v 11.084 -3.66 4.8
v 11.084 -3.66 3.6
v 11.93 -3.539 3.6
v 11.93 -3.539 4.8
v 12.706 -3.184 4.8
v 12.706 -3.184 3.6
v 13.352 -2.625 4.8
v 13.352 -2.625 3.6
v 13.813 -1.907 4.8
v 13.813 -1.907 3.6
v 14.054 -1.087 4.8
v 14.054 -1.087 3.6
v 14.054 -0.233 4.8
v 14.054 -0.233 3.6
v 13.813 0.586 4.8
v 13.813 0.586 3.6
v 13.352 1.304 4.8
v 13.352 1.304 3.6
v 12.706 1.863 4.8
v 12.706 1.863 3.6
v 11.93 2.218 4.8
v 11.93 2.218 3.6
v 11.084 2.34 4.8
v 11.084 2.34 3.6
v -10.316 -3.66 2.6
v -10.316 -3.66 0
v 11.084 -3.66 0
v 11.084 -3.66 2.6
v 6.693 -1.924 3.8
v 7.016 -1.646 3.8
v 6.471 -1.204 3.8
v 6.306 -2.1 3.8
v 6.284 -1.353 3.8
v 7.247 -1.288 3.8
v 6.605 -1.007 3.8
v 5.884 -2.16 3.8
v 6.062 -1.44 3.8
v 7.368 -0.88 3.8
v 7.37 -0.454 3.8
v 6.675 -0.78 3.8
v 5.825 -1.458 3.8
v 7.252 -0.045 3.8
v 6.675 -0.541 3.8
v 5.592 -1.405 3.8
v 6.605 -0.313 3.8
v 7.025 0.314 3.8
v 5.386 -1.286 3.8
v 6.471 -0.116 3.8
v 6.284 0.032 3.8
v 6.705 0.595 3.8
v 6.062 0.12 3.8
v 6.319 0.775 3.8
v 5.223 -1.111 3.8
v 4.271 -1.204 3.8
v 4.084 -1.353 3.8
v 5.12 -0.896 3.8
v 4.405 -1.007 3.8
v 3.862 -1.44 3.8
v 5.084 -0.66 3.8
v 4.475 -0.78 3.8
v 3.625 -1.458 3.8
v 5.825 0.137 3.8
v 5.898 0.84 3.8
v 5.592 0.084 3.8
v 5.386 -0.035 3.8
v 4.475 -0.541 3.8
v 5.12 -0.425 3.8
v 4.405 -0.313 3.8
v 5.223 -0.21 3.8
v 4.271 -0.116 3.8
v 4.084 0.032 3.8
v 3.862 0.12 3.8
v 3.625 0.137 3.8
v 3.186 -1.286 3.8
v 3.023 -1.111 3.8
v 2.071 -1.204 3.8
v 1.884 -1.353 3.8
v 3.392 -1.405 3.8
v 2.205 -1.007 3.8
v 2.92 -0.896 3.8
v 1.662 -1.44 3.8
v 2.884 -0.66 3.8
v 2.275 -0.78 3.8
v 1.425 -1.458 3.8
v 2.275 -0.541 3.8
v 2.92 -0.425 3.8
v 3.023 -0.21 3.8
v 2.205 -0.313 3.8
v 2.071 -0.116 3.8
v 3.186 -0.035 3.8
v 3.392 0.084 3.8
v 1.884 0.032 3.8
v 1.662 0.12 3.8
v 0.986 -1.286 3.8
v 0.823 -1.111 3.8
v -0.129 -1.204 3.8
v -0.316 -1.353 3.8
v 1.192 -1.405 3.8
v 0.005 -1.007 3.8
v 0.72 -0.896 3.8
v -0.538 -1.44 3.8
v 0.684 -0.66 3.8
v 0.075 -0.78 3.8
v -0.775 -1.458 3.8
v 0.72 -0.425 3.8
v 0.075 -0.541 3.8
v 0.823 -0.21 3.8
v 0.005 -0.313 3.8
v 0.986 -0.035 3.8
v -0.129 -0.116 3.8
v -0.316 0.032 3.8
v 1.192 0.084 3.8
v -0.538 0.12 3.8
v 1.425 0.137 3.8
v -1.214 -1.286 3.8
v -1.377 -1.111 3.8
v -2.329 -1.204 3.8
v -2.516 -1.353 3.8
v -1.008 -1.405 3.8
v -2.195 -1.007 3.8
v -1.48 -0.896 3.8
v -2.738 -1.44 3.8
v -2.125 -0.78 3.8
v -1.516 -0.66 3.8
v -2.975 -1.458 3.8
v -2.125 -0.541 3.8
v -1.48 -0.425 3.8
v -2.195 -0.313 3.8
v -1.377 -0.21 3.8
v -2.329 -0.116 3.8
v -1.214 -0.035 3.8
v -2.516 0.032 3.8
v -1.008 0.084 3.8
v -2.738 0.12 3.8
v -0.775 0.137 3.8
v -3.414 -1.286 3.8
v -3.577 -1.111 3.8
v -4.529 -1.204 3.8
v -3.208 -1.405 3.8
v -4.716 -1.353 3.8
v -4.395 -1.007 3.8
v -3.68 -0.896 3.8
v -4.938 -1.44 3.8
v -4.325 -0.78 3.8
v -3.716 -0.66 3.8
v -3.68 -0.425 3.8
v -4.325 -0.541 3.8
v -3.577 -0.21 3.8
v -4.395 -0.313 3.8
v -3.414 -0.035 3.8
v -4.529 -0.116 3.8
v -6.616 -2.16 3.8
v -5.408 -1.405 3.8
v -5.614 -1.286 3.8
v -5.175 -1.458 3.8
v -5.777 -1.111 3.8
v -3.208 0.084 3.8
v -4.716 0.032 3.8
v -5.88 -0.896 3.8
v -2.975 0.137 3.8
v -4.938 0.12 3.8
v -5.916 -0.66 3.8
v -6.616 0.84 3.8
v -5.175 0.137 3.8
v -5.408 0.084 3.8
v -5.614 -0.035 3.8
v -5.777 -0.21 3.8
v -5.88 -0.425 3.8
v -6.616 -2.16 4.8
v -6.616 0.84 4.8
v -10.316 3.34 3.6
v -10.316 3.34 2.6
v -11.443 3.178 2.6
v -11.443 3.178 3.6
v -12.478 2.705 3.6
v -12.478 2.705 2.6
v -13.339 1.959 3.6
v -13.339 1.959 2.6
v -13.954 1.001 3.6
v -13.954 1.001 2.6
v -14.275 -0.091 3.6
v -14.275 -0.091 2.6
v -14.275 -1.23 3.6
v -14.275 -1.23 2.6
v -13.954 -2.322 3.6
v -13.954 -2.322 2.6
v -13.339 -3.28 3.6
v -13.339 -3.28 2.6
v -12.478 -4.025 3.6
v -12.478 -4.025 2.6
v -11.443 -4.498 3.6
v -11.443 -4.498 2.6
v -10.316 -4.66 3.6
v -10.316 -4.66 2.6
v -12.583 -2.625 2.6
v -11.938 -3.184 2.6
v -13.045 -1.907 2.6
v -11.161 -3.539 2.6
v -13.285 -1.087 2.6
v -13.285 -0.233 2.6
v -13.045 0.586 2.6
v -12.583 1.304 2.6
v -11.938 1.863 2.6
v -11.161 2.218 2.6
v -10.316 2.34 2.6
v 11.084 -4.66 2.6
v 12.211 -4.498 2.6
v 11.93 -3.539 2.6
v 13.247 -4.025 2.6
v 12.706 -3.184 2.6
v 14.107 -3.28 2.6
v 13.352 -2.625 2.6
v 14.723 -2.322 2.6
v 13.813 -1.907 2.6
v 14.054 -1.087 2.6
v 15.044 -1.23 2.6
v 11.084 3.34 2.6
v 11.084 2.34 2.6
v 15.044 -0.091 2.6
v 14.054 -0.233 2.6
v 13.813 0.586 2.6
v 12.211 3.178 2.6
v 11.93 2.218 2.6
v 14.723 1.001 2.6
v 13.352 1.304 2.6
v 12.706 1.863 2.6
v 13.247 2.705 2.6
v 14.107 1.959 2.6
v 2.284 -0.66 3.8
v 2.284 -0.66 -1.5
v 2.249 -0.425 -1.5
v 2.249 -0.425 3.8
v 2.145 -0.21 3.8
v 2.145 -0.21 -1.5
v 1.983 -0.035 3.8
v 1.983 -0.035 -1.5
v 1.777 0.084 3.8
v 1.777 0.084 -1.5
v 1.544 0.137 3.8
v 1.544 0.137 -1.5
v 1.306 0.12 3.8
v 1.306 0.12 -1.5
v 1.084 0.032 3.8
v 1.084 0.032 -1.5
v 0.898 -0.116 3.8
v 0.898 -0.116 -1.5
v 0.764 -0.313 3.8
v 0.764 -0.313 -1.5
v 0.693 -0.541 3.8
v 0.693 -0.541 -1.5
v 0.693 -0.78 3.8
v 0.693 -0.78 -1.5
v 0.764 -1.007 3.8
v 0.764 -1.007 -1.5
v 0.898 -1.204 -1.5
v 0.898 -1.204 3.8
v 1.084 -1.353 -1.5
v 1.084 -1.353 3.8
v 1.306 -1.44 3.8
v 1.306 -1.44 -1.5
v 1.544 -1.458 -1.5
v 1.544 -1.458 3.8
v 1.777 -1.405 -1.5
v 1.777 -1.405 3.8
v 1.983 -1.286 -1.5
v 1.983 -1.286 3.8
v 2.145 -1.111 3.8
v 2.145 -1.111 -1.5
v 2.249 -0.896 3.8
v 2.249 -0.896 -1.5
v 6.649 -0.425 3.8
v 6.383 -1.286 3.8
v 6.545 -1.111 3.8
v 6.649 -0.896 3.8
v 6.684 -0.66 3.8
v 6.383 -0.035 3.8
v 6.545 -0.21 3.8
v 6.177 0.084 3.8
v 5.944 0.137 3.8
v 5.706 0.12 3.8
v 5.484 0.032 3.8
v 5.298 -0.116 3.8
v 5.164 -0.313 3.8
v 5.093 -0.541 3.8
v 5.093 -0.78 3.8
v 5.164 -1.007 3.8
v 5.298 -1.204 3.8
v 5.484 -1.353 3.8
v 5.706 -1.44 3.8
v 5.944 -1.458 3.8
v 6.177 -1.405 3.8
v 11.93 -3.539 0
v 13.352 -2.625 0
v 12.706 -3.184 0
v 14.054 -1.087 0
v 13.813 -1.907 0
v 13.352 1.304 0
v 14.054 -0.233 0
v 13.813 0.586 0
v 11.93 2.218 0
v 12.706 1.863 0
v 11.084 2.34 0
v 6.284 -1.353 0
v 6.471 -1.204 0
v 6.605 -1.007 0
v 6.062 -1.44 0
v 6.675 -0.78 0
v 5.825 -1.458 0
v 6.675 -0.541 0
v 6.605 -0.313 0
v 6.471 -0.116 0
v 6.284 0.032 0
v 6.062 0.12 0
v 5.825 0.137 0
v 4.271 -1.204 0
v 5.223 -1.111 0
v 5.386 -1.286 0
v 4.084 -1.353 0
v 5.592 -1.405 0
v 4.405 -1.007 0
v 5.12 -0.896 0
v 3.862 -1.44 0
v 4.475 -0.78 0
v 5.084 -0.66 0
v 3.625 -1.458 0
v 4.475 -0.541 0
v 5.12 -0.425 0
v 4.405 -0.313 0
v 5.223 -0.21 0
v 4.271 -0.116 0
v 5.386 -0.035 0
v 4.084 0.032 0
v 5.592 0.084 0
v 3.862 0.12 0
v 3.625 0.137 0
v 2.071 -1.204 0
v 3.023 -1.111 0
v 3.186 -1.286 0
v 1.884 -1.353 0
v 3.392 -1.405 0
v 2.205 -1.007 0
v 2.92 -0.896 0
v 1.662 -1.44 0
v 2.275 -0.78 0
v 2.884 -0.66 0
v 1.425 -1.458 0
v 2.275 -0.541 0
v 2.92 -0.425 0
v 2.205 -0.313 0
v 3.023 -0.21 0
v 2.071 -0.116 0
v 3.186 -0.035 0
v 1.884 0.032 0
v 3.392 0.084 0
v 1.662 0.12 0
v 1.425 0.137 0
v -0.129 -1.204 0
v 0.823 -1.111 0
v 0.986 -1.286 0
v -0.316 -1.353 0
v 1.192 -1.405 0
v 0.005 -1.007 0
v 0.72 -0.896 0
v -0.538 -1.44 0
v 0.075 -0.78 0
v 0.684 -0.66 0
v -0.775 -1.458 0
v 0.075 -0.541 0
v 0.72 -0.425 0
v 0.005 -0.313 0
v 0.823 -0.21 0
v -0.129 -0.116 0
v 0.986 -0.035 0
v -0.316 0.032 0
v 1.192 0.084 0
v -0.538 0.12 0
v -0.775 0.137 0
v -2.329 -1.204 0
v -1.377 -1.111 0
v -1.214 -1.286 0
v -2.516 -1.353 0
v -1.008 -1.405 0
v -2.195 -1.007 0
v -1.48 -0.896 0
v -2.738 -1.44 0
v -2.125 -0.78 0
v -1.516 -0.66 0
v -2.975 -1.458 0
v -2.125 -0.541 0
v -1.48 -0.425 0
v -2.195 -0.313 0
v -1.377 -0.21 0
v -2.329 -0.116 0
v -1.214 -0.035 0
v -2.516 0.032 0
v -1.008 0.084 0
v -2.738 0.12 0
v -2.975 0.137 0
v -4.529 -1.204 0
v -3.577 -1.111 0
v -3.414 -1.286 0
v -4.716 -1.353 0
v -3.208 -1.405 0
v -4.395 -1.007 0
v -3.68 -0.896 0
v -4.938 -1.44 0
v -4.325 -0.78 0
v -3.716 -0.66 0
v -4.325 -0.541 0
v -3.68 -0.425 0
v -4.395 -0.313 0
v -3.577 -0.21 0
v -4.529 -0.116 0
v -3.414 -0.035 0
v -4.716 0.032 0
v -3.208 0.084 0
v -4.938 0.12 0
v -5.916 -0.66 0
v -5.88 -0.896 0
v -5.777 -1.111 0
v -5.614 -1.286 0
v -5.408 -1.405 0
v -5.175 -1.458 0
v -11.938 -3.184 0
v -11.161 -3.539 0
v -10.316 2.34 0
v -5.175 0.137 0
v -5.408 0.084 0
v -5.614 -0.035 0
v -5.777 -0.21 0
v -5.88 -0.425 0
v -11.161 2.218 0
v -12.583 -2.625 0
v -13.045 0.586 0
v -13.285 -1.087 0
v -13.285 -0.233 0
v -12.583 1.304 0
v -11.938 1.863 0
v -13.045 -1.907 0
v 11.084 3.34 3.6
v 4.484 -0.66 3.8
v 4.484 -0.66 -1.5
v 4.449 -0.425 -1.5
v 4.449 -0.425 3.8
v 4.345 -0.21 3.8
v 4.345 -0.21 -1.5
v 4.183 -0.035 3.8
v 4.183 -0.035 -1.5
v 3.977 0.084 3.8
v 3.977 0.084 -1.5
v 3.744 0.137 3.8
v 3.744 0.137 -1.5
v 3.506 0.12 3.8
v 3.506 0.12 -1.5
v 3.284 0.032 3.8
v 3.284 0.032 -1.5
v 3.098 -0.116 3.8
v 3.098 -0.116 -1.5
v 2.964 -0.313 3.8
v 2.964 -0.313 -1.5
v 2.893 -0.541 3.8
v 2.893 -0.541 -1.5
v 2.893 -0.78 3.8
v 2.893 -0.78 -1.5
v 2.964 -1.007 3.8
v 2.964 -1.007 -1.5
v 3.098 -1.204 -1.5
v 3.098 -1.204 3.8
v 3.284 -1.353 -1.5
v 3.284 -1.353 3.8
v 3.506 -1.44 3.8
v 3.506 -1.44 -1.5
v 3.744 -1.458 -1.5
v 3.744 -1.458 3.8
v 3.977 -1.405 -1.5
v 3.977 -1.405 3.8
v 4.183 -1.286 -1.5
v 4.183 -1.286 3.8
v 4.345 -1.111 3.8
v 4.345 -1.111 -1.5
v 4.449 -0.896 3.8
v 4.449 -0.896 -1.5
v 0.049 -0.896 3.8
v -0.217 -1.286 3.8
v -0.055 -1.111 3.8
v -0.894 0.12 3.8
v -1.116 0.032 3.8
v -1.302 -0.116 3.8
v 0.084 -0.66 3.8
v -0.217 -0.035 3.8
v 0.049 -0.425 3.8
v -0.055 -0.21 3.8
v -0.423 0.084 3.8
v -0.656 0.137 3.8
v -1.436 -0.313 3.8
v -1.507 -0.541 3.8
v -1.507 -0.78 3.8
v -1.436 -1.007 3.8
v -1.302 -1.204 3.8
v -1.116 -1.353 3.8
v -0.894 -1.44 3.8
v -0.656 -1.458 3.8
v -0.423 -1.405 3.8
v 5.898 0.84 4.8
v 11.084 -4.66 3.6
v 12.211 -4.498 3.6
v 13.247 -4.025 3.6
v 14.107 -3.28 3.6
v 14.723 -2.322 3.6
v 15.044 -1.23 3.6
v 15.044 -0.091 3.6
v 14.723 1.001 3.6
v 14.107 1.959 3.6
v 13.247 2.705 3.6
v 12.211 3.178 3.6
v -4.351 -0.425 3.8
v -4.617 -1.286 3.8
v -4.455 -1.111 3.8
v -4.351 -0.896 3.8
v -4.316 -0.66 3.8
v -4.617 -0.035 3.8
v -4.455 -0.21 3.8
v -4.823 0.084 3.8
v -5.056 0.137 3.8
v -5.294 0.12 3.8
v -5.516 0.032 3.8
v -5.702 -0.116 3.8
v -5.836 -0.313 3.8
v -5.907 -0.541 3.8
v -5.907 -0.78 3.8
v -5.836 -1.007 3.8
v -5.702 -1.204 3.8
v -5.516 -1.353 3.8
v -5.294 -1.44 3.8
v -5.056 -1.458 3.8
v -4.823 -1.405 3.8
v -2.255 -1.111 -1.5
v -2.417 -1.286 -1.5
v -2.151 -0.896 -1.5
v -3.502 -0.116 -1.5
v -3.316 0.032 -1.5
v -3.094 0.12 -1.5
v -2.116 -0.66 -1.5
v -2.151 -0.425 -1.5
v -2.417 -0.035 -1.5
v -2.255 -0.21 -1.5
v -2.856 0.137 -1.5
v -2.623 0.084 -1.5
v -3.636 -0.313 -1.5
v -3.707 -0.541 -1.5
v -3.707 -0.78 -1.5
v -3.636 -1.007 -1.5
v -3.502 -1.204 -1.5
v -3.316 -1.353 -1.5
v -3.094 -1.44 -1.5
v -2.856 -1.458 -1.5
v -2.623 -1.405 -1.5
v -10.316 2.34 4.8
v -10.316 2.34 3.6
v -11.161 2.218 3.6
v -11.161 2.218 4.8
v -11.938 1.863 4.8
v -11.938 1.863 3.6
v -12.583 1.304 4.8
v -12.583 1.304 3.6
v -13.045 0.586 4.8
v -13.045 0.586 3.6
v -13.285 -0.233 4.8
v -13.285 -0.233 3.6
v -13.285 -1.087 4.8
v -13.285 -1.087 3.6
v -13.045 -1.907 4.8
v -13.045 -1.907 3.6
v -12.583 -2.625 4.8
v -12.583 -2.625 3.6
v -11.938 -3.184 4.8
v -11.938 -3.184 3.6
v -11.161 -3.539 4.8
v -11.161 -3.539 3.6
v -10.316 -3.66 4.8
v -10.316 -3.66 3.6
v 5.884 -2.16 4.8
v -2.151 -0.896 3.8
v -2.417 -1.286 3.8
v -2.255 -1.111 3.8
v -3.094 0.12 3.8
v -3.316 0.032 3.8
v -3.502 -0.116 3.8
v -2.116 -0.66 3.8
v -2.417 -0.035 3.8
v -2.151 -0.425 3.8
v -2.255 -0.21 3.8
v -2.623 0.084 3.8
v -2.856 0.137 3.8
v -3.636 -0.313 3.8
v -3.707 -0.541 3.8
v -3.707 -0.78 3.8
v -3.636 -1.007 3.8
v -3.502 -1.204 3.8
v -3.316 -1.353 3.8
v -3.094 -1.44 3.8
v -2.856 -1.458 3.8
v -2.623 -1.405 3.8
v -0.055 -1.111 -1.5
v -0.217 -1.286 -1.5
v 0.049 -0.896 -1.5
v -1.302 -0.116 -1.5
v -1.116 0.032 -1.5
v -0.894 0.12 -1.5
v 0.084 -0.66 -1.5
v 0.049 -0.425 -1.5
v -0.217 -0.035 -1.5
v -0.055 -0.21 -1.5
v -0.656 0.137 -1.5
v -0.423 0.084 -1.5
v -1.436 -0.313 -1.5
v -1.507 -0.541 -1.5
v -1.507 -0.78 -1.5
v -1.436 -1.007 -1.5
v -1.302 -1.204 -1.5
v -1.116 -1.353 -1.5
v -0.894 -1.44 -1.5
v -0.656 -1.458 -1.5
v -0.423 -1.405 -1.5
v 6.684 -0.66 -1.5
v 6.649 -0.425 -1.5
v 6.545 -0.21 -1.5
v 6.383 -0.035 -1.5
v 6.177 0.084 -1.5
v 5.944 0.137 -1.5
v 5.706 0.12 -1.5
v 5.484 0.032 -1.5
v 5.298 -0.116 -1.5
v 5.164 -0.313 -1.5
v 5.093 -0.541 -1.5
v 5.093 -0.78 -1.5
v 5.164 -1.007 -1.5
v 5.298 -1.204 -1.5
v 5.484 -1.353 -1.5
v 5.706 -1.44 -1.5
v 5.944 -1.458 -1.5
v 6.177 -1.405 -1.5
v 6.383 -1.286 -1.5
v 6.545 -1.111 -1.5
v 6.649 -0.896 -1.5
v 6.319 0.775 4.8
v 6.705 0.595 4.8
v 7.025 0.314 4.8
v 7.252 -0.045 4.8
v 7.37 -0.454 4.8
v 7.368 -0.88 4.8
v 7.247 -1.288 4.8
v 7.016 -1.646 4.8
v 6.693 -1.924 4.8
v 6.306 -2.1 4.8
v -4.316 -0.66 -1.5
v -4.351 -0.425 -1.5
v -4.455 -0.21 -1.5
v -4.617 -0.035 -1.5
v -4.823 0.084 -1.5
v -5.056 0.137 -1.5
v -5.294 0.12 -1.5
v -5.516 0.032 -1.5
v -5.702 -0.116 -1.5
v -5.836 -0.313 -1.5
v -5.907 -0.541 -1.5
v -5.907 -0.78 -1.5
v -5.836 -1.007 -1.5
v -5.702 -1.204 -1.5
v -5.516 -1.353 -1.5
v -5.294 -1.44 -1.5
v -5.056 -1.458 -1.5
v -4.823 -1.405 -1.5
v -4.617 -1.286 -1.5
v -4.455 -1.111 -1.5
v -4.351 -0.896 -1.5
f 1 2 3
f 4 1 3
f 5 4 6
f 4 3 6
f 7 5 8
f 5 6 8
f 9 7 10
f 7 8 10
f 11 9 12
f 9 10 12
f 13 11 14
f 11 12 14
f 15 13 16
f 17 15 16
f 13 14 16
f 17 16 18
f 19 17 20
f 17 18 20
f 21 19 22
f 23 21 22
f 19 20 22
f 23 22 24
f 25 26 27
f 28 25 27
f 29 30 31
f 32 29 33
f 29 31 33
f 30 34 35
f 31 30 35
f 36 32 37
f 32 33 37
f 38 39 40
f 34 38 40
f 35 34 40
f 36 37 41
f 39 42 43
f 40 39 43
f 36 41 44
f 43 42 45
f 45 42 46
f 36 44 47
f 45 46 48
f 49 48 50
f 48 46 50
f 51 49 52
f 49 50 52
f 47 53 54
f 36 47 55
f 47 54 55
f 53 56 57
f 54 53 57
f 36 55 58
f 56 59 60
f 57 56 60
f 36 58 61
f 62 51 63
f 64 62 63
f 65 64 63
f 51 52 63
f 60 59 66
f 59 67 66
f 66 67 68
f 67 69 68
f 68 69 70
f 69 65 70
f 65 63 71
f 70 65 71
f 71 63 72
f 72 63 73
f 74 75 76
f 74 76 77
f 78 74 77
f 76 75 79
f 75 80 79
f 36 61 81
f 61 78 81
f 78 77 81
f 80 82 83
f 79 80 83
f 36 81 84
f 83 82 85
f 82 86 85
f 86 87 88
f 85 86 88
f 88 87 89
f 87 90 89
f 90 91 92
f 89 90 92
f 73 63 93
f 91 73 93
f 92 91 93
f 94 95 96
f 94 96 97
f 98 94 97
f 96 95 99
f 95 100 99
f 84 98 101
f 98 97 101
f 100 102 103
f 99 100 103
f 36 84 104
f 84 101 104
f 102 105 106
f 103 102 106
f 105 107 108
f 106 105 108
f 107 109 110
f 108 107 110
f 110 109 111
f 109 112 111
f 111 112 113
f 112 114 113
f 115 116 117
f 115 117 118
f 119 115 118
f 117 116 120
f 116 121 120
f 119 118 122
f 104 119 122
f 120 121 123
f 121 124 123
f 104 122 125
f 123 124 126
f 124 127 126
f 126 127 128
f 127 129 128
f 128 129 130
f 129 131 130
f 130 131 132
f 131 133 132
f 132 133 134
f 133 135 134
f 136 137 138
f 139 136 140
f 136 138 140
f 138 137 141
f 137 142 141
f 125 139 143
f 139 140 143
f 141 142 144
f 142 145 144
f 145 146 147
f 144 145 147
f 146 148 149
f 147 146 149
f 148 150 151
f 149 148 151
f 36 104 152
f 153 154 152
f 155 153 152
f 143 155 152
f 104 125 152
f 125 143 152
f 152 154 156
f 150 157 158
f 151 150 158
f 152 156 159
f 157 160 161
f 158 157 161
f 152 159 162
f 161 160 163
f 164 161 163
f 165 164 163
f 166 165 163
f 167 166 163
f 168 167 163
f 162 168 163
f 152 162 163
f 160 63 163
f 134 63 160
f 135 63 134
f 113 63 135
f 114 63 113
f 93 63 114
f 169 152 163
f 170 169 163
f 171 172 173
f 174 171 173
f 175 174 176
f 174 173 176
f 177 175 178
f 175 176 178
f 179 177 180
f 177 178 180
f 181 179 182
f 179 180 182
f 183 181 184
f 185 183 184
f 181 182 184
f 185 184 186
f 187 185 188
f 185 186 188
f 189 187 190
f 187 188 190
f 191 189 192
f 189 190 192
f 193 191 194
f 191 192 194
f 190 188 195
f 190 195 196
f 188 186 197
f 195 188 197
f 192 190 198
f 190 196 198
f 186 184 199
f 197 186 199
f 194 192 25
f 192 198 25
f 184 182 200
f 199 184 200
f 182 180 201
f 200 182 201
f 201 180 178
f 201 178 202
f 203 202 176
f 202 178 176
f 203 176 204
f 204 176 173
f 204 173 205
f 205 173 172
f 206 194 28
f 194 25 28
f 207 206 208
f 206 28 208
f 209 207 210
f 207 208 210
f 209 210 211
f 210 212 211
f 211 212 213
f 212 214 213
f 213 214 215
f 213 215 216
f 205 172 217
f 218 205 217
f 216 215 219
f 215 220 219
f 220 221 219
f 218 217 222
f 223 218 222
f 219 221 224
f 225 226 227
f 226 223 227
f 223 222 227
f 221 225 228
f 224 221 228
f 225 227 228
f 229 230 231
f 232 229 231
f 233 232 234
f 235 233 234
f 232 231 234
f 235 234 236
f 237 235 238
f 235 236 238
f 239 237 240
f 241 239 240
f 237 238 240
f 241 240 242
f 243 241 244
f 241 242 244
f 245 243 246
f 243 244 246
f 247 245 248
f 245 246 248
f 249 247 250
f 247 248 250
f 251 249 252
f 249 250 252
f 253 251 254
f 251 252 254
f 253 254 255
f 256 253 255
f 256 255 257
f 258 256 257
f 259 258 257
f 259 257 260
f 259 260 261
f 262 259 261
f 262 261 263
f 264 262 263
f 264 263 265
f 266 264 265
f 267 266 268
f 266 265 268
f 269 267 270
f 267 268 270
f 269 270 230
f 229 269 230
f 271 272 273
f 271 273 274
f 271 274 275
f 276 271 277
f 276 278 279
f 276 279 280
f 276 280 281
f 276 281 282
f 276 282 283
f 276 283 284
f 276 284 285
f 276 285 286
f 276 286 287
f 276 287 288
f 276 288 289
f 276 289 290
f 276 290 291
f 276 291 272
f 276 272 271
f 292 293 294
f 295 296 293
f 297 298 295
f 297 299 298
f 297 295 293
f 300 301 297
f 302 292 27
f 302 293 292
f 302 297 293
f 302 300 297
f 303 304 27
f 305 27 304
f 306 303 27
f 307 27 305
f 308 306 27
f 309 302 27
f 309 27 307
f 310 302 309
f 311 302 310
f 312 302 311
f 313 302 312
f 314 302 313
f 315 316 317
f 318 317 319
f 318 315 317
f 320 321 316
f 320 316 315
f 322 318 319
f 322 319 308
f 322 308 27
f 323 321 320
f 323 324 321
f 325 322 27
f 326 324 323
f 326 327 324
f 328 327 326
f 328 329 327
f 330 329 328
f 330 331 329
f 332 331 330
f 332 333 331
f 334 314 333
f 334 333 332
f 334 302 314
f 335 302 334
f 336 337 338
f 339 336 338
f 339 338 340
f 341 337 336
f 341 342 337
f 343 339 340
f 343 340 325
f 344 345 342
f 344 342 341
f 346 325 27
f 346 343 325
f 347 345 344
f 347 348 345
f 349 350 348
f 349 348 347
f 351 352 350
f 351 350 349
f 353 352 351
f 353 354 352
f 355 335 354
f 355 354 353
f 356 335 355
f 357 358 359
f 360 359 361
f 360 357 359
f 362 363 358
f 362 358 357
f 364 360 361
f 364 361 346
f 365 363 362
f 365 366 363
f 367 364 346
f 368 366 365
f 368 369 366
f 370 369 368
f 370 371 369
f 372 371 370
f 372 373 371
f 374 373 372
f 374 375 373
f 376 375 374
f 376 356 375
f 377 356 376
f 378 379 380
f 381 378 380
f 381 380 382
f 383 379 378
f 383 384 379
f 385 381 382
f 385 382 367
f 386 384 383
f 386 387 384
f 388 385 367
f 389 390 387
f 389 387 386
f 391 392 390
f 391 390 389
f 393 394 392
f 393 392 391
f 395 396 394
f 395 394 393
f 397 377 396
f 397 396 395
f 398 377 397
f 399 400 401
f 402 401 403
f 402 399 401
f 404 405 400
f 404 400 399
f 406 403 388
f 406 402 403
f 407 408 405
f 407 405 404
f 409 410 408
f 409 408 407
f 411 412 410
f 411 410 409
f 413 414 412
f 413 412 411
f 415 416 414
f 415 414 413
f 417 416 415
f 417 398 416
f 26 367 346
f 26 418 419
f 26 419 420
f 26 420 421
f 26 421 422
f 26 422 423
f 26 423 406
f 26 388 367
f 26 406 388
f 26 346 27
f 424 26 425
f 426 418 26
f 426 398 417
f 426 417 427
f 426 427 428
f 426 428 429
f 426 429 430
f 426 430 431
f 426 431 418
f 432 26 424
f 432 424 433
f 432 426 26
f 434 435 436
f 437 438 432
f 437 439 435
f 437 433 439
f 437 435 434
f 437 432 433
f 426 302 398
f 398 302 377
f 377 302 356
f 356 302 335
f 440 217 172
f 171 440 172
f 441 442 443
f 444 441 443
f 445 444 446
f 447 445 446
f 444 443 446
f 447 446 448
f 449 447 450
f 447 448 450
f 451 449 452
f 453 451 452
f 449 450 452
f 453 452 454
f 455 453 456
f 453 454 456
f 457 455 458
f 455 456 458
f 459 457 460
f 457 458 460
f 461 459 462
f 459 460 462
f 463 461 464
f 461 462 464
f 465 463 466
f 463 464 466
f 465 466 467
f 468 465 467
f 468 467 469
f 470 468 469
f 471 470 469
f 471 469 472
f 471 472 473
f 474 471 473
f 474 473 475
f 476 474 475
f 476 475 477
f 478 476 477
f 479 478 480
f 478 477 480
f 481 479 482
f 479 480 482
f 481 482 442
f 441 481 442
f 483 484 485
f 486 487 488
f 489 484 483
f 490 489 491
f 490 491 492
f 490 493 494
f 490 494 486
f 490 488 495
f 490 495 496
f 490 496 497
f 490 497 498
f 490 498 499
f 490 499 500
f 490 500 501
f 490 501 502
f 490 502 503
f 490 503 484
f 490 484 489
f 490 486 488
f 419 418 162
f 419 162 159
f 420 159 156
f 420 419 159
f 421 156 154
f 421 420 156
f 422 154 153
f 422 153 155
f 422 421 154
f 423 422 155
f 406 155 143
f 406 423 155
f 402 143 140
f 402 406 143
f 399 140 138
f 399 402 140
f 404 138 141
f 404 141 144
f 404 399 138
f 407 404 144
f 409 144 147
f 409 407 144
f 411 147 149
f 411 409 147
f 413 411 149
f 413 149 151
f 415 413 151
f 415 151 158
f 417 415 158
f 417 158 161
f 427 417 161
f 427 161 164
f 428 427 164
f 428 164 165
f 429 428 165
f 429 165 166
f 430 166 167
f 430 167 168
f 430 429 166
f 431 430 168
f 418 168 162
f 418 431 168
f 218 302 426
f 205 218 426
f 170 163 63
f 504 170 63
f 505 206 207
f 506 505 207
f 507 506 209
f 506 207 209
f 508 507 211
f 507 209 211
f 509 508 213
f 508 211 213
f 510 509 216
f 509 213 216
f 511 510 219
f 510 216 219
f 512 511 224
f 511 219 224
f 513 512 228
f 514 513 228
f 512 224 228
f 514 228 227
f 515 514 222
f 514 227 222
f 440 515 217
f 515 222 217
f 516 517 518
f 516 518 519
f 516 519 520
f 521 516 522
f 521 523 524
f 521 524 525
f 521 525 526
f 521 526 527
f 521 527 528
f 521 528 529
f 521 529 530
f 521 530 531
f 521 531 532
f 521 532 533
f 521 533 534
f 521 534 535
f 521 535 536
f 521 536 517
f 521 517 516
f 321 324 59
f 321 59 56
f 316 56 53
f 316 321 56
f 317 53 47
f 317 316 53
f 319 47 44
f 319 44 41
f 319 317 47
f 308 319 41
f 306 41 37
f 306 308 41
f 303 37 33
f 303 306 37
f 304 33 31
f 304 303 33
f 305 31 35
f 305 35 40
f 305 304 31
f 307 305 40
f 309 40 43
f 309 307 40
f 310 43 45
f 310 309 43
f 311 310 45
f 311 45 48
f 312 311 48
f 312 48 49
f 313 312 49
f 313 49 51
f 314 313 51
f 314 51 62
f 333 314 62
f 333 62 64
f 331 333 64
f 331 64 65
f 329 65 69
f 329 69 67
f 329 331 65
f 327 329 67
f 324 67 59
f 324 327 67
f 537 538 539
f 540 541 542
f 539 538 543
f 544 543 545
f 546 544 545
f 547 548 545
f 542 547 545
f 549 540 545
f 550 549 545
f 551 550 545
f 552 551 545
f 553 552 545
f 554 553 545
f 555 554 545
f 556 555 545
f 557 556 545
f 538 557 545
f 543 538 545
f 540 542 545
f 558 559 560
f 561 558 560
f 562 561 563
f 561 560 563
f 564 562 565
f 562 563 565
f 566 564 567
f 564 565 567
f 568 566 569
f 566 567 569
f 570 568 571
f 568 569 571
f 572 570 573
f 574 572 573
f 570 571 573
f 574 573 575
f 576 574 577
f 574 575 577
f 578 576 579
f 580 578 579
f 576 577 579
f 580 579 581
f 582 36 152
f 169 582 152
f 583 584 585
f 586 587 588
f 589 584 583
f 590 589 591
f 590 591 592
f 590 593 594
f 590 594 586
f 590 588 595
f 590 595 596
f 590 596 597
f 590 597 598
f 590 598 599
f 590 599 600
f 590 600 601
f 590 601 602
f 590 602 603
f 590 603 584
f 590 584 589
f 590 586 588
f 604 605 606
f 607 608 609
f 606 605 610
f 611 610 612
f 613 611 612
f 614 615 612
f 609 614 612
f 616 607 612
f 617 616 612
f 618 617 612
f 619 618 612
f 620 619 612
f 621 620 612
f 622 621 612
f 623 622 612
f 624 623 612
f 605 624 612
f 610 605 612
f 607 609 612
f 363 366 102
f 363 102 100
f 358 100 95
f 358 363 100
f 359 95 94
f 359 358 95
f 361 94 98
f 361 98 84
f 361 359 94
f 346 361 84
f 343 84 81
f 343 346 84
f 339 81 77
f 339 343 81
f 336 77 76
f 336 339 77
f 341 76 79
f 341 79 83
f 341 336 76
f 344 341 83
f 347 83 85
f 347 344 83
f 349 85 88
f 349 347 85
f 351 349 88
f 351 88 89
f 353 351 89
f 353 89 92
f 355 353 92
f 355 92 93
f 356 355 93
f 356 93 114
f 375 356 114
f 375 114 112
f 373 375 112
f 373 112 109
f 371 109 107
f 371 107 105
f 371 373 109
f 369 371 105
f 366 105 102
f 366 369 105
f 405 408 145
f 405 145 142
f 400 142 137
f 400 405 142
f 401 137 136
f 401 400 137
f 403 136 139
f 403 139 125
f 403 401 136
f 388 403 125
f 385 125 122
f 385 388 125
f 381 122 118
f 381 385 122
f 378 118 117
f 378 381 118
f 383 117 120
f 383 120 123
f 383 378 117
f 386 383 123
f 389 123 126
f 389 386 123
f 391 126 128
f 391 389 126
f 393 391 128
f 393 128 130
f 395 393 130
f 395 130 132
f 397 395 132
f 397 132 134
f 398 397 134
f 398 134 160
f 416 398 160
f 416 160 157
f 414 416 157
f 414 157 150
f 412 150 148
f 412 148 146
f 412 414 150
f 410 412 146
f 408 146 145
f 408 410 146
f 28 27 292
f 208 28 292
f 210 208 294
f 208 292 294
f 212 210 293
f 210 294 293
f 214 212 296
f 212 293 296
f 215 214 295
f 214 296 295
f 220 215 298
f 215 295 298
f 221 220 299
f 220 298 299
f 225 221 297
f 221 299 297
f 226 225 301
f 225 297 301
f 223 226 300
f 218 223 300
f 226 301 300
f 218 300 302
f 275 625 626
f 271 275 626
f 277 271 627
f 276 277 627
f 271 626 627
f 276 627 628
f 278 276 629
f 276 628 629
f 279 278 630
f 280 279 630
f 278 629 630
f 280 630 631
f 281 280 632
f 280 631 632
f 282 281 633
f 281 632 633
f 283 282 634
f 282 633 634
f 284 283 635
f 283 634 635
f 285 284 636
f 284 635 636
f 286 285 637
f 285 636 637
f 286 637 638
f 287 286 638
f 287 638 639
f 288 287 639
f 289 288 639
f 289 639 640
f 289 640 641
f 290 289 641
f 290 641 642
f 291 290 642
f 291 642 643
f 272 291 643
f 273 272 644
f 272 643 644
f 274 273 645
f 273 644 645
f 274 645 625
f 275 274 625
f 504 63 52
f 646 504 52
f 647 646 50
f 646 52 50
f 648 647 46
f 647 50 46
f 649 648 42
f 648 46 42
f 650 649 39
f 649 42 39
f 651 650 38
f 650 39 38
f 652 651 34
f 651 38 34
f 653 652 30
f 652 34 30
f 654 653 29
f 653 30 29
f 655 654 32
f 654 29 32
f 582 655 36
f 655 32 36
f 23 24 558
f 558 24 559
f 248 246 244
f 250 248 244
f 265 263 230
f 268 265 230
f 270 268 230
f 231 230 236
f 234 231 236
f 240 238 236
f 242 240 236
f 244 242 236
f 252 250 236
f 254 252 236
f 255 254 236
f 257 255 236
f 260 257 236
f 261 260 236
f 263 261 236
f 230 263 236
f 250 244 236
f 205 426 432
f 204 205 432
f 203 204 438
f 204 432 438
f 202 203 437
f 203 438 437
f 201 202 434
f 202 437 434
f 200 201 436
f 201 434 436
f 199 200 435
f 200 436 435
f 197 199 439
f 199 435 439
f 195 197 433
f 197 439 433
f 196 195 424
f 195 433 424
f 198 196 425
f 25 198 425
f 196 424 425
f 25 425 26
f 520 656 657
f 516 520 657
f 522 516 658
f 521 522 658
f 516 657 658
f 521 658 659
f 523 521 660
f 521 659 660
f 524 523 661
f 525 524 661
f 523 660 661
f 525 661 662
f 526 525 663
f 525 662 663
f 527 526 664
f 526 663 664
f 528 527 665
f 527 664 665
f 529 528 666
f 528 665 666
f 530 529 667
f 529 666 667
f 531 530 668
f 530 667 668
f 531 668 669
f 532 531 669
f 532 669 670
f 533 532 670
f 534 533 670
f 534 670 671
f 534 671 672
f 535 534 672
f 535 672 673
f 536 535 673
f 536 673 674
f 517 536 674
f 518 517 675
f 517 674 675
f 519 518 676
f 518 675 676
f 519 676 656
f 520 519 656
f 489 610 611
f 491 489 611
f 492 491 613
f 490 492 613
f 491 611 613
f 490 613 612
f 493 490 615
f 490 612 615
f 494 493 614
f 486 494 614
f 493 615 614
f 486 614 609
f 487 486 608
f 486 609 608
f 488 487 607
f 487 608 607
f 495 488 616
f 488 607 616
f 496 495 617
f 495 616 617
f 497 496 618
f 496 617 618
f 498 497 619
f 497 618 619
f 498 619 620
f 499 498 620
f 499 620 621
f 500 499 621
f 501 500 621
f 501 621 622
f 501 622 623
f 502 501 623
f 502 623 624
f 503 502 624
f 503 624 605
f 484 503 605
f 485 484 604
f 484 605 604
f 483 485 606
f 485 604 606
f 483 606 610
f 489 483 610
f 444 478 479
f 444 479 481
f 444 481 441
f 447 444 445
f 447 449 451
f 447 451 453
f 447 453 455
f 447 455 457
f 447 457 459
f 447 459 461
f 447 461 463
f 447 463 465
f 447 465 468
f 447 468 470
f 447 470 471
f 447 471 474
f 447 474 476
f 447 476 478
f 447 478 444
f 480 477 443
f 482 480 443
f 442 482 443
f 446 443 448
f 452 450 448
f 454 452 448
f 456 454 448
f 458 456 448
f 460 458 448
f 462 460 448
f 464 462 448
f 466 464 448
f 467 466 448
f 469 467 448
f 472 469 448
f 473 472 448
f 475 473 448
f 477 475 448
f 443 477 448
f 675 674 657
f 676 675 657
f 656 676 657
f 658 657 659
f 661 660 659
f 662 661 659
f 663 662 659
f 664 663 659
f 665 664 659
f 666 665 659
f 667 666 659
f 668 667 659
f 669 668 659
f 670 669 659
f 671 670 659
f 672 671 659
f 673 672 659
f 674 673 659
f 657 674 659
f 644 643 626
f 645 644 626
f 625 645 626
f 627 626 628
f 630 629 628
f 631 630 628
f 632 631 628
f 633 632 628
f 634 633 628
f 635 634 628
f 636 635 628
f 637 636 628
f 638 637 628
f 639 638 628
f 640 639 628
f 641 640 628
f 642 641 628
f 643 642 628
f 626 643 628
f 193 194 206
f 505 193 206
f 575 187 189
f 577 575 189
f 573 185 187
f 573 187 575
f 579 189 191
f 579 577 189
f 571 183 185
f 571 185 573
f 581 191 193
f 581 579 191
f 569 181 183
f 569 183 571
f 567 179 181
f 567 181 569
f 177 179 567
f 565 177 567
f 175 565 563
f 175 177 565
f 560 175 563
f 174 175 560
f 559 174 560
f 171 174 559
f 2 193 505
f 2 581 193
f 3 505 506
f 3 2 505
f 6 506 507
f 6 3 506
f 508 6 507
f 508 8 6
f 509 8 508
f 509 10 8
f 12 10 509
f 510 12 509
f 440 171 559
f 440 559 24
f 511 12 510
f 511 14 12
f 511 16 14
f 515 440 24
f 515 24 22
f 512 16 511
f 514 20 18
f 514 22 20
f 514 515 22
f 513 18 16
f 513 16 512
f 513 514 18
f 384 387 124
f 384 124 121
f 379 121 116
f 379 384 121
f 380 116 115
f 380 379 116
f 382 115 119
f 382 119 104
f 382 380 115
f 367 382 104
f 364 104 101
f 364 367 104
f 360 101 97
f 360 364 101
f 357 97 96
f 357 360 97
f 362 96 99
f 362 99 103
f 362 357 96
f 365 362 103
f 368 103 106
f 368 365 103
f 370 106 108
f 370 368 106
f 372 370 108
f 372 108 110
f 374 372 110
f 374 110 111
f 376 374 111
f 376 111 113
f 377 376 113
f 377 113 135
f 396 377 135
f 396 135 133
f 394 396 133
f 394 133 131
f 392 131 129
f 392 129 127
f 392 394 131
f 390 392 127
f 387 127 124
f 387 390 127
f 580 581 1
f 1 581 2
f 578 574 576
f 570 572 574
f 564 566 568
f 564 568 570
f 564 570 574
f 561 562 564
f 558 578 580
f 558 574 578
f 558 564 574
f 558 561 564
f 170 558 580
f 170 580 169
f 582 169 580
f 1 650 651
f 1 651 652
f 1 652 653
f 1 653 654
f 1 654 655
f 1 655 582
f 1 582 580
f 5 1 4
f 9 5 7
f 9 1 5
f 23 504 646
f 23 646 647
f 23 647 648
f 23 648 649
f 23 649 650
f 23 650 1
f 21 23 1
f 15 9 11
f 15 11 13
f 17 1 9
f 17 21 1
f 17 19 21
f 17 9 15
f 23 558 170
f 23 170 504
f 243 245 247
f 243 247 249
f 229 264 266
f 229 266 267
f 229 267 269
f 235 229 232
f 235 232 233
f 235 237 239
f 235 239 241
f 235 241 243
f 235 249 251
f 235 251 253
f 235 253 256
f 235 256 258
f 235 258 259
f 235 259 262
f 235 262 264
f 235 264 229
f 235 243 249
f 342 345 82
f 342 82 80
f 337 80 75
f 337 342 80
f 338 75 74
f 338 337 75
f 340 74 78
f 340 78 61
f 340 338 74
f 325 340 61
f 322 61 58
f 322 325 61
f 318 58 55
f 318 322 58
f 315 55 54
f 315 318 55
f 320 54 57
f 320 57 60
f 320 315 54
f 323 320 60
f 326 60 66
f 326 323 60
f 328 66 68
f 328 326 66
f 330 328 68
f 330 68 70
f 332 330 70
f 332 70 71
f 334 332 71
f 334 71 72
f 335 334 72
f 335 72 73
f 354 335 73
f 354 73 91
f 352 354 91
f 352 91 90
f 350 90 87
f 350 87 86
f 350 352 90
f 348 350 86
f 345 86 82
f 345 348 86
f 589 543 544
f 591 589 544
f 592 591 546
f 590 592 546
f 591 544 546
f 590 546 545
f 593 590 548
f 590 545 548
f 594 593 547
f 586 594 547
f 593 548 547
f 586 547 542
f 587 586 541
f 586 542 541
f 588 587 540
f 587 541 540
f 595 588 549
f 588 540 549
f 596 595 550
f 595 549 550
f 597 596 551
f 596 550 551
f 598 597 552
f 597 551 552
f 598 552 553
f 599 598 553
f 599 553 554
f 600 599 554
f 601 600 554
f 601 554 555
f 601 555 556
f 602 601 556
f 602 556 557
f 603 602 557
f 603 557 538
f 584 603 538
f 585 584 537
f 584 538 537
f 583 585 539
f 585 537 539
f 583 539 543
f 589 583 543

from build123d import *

# Parameters (mm, degrees)
BOSS_EXTRUDE1_DEPTH        = 4.8
SKETCH1_3_R                = 0.8
BOSS_EXTRUDE2_DEPTH        = 3.8
BOSS_EXTRUDE3_START        = 2.6
BOSS_EXTRUDE3_DEPTH        = 1
BOSS_EXTRUDE4_DEPTH        = 3.8
BOSS_EXTRUDE4_DEPTH_BACK   = 1.5
SKETCH1_5_R                = 0.8
BOSS_EXTRUDE4_2_DEPTH      = 3.8
BOSS_EXTRUDE4_2_DEPTH_BACK = 1.5
BOSS_EXTRUDE4_3_DEPTH      = 3.8
BOSS_EXTRUDE4_3_DEPTH_BACK = 1.5
BOSS_EXTRUDE4_4_DEPTH      = 3.8
BOSS_EXTRUDE4_4_DEPTH_BACK = 1.5
BOSS_EXTRUDE4_5_DEPTH      = 3.8
BOSS_EXTRUDE4_5_DEPTH_BACK = 1.5
BOSS_EXTRUDE4_6_DEPTH      = 3.8
BOSS_EXTRUDE4_6_DEPTH_BACK = 1.5


with BuildPart() as part:
    # Sketch1 → Boss-Extrude1 (new body)
    with BuildSketch(Plane.XY):
        with BuildLine():
            Line((11.084370489, 2.339660796), (-10.315629511, 2.339660796))
            ThreePointArc((-10.315629511, 2.339660796), (-13.315629511, -0.660339204), (-10.315629511, -3.660339204))
            Line((-10.315629511, -3.660339204), (11.084370489, -3.660339204))
            ThreePointArc((11.084370489, -3.660339204), (14.084370489, -0.660339204), (11.084370489, 2.339660796))
        make_face()
        with BuildLine():
            ThreePointArc((5.898308619, 0.839596037), (7.384354299, -0.667308526), (5.884370126, -2.160339204))
            Line((5.884370126, -2.160339204), (-6.615645701, -2.16033618))
            Line((-6.615645701, -2.16033618), (-6.615645701, 0.839596037))
            Line((-6.615645701, 0.839596037), (5.898308619, 0.839596037))
        make_face(mode=Mode.SUBTRACT)
    extrude(amount=BOSS_EXTRUDE1_DEPTH)

    # Sketch1<3> → Boss-Extrude2 (add)
    with BuildSketch(Plane.XY):
        with BuildLine():
            Line((-6.615645701, -2.16033618), (5.884370126, -2.160339204))
            ThreePointArc((5.884370126, -2.160339204), (7.384354299, -0.667308526), (5.898308619, 0.839596037))
            Line((5.898308619, 0.839596037), (-6.615645701, 0.839596037))
            Line((-6.615645701, 0.839596037), (-6.615645701, -2.16033618))
        make_face()
        with Locations((-5.115629511, -0.660339204)):
            Circle(SKETCH1_3_R, mode=Mode.SUBTRACT)
        with Locations((-2.915629511, -0.660339204)):
            Circle(SKETCH1_3_R, mode=Mode.SUBTRACT)
        with Locations((-0.715629511, -0.660339204)):
            Circle(SKETCH1_3_R, mode=Mode.SUBTRACT)
        with Locations((1.484370489, -0.660339204)):
            Circle(SKETCH1_3_R, mode=Mode.SUBTRACT)
        with Locations((3.684370489, -0.660339204)):
            Circle(SKETCH1_3_R, mode=Mode.SUBTRACT)
        with Locations((5.884370489, -0.660339204)):
            Circle(SKETCH1_3_R, mode=Mode.SUBTRACT)
    extrude(amount=BOSS_EXTRUDE2_DEPTH)

    # Sketch1<4> → Boss-Extrude3 (add)
    with BuildSketch(Plane.XY.offset(BOSS_EXTRUDE3_START)):
        with BuildLine():
            Line((11.084370489, 3.339660796), (-10.315629511, 3.339660796))
            ThreePointArc((-10.315629511, 3.339660796), (-14.315629511, -0.660339204), (-10.315629511, -4.660339204))
            Line((-10.315629511, -4.660339204), (11.084370489, -4.660339204))
            ThreePointArc((11.084370489, -4.660339204), (15.084370489, -0.660339204), (11.084370489, 3.339660796))
        make_face()
        with BuildLine():
            ThreePointArc((-10.315629511, -3.660339204), (-13.315629511, -0.660339204), (-10.315629511, 2.339660796))
            Line((-10.315629511, 2.339660796), (11.084370489, 2.339660796))
            ThreePointArc((11.084370489, 2.339660796), (14.084370489, -0.660339204), (11.084370489, -3.660339204))
            Line((11.084370489, -3.660339204), (-10.315629511, -3.660339204))
        make_face(mode=Mode.SUBTRACT)
    extrude(amount=BOSS_EXTRUDE3_DEPTH)


with BuildPart() as body_2:
    # Sketch1<5> → Boss-Extrude4 (new, two sides: drawn at the far end of the back side and taken through both)
    with BuildSketch(Plane.XY.offset(-BOSS_EXTRUDE4_DEPTH_BACK)):
        with Locations((1.484370489, -0.660339204)):
            Circle(SKETCH1_5_R)
    extrude(amount=BOSS_EXTRUDE4_DEPTH + BOSS_EXTRUDE4_DEPTH_BACK)


with BuildPart() as body_3:
    # Sketch1<5> → Boss-Extrude4 2 (new, two sides: drawn at the far end of the back side and taken through both)
    with BuildSketch(Plane.XY.offset(-BOSS_EXTRUDE4_2_DEPTH_BACK)):
        with Locations((3.684370489, -0.660339204)):
            Circle(SKETCH1_5_R)
    extrude(amount=BOSS_EXTRUDE4_2_DEPTH + BOSS_EXTRUDE4_2_DEPTH_BACK)


with BuildPart() as body_4:
    # Sketch1<5> → Boss-Extrude4 3 (new, two sides: drawn at the far end of the back side and taken through both)
    with BuildSketch(Plane.XY.offset(-BOSS_EXTRUDE4_3_DEPTH_BACK)):
        with Locations((5.884370489, -0.660339204)):
            Circle(SKETCH1_5_R)
    extrude(amount=BOSS_EXTRUDE4_3_DEPTH + BOSS_EXTRUDE4_3_DEPTH_BACK)


with BuildPart() as body_5:
    # Sketch1<5> → Boss-Extrude4 4 (new, two sides: drawn at the far end of the back side and taken through both)
    with BuildSketch(Plane.XY.offset(-BOSS_EXTRUDE4_4_DEPTH_BACK)):
        with Locations((-5.115629511, -0.660339204)):
            Circle(SKETCH1_5_R)
    extrude(amount=BOSS_EXTRUDE4_4_DEPTH + BOSS_EXTRUDE4_4_DEPTH_BACK)


with BuildPart() as body_6:
    # Sketch1<5> → Boss-Extrude4 5 (new, two sides: drawn at the far end of the back side and taken through both)
    with BuildSketch(Plane.XY.offset(-BOSS_EXTRUDE4_5_DEPTH_BACK)):
        with Locations((-2.915629511, -0.660339204)):
            Circle(SKETCH1_5_R)
    extrude(amount=BOSS_EXTRUDE4_5_DEPTH + BOSS_EXTRUDE4_5_DEPTH_BACK)


with BuildPart() as body_7:
    # Sketch1<5> → Boss-Extrude4 6 (new, two sides: drawn at the far end of the back side and taken through both)
    with BuildSketch(Plane.XY.offset(-BOSS_EXTRUDE4_6_DEPTH_BACK)):
        with Locations((-0.715629511, -0.660339204)):
            Circle(SKETCH1_5_R)
    extrude(amount=BOSS_EXTRUDE4_6_DEPTH + BOSS_EXTRUDE4_6_DEPTH_BACK)


solid = Compound([part.part, body_2.part, body_3.part, body_4.part, body_5.part, body_6.part, body_7.part])
